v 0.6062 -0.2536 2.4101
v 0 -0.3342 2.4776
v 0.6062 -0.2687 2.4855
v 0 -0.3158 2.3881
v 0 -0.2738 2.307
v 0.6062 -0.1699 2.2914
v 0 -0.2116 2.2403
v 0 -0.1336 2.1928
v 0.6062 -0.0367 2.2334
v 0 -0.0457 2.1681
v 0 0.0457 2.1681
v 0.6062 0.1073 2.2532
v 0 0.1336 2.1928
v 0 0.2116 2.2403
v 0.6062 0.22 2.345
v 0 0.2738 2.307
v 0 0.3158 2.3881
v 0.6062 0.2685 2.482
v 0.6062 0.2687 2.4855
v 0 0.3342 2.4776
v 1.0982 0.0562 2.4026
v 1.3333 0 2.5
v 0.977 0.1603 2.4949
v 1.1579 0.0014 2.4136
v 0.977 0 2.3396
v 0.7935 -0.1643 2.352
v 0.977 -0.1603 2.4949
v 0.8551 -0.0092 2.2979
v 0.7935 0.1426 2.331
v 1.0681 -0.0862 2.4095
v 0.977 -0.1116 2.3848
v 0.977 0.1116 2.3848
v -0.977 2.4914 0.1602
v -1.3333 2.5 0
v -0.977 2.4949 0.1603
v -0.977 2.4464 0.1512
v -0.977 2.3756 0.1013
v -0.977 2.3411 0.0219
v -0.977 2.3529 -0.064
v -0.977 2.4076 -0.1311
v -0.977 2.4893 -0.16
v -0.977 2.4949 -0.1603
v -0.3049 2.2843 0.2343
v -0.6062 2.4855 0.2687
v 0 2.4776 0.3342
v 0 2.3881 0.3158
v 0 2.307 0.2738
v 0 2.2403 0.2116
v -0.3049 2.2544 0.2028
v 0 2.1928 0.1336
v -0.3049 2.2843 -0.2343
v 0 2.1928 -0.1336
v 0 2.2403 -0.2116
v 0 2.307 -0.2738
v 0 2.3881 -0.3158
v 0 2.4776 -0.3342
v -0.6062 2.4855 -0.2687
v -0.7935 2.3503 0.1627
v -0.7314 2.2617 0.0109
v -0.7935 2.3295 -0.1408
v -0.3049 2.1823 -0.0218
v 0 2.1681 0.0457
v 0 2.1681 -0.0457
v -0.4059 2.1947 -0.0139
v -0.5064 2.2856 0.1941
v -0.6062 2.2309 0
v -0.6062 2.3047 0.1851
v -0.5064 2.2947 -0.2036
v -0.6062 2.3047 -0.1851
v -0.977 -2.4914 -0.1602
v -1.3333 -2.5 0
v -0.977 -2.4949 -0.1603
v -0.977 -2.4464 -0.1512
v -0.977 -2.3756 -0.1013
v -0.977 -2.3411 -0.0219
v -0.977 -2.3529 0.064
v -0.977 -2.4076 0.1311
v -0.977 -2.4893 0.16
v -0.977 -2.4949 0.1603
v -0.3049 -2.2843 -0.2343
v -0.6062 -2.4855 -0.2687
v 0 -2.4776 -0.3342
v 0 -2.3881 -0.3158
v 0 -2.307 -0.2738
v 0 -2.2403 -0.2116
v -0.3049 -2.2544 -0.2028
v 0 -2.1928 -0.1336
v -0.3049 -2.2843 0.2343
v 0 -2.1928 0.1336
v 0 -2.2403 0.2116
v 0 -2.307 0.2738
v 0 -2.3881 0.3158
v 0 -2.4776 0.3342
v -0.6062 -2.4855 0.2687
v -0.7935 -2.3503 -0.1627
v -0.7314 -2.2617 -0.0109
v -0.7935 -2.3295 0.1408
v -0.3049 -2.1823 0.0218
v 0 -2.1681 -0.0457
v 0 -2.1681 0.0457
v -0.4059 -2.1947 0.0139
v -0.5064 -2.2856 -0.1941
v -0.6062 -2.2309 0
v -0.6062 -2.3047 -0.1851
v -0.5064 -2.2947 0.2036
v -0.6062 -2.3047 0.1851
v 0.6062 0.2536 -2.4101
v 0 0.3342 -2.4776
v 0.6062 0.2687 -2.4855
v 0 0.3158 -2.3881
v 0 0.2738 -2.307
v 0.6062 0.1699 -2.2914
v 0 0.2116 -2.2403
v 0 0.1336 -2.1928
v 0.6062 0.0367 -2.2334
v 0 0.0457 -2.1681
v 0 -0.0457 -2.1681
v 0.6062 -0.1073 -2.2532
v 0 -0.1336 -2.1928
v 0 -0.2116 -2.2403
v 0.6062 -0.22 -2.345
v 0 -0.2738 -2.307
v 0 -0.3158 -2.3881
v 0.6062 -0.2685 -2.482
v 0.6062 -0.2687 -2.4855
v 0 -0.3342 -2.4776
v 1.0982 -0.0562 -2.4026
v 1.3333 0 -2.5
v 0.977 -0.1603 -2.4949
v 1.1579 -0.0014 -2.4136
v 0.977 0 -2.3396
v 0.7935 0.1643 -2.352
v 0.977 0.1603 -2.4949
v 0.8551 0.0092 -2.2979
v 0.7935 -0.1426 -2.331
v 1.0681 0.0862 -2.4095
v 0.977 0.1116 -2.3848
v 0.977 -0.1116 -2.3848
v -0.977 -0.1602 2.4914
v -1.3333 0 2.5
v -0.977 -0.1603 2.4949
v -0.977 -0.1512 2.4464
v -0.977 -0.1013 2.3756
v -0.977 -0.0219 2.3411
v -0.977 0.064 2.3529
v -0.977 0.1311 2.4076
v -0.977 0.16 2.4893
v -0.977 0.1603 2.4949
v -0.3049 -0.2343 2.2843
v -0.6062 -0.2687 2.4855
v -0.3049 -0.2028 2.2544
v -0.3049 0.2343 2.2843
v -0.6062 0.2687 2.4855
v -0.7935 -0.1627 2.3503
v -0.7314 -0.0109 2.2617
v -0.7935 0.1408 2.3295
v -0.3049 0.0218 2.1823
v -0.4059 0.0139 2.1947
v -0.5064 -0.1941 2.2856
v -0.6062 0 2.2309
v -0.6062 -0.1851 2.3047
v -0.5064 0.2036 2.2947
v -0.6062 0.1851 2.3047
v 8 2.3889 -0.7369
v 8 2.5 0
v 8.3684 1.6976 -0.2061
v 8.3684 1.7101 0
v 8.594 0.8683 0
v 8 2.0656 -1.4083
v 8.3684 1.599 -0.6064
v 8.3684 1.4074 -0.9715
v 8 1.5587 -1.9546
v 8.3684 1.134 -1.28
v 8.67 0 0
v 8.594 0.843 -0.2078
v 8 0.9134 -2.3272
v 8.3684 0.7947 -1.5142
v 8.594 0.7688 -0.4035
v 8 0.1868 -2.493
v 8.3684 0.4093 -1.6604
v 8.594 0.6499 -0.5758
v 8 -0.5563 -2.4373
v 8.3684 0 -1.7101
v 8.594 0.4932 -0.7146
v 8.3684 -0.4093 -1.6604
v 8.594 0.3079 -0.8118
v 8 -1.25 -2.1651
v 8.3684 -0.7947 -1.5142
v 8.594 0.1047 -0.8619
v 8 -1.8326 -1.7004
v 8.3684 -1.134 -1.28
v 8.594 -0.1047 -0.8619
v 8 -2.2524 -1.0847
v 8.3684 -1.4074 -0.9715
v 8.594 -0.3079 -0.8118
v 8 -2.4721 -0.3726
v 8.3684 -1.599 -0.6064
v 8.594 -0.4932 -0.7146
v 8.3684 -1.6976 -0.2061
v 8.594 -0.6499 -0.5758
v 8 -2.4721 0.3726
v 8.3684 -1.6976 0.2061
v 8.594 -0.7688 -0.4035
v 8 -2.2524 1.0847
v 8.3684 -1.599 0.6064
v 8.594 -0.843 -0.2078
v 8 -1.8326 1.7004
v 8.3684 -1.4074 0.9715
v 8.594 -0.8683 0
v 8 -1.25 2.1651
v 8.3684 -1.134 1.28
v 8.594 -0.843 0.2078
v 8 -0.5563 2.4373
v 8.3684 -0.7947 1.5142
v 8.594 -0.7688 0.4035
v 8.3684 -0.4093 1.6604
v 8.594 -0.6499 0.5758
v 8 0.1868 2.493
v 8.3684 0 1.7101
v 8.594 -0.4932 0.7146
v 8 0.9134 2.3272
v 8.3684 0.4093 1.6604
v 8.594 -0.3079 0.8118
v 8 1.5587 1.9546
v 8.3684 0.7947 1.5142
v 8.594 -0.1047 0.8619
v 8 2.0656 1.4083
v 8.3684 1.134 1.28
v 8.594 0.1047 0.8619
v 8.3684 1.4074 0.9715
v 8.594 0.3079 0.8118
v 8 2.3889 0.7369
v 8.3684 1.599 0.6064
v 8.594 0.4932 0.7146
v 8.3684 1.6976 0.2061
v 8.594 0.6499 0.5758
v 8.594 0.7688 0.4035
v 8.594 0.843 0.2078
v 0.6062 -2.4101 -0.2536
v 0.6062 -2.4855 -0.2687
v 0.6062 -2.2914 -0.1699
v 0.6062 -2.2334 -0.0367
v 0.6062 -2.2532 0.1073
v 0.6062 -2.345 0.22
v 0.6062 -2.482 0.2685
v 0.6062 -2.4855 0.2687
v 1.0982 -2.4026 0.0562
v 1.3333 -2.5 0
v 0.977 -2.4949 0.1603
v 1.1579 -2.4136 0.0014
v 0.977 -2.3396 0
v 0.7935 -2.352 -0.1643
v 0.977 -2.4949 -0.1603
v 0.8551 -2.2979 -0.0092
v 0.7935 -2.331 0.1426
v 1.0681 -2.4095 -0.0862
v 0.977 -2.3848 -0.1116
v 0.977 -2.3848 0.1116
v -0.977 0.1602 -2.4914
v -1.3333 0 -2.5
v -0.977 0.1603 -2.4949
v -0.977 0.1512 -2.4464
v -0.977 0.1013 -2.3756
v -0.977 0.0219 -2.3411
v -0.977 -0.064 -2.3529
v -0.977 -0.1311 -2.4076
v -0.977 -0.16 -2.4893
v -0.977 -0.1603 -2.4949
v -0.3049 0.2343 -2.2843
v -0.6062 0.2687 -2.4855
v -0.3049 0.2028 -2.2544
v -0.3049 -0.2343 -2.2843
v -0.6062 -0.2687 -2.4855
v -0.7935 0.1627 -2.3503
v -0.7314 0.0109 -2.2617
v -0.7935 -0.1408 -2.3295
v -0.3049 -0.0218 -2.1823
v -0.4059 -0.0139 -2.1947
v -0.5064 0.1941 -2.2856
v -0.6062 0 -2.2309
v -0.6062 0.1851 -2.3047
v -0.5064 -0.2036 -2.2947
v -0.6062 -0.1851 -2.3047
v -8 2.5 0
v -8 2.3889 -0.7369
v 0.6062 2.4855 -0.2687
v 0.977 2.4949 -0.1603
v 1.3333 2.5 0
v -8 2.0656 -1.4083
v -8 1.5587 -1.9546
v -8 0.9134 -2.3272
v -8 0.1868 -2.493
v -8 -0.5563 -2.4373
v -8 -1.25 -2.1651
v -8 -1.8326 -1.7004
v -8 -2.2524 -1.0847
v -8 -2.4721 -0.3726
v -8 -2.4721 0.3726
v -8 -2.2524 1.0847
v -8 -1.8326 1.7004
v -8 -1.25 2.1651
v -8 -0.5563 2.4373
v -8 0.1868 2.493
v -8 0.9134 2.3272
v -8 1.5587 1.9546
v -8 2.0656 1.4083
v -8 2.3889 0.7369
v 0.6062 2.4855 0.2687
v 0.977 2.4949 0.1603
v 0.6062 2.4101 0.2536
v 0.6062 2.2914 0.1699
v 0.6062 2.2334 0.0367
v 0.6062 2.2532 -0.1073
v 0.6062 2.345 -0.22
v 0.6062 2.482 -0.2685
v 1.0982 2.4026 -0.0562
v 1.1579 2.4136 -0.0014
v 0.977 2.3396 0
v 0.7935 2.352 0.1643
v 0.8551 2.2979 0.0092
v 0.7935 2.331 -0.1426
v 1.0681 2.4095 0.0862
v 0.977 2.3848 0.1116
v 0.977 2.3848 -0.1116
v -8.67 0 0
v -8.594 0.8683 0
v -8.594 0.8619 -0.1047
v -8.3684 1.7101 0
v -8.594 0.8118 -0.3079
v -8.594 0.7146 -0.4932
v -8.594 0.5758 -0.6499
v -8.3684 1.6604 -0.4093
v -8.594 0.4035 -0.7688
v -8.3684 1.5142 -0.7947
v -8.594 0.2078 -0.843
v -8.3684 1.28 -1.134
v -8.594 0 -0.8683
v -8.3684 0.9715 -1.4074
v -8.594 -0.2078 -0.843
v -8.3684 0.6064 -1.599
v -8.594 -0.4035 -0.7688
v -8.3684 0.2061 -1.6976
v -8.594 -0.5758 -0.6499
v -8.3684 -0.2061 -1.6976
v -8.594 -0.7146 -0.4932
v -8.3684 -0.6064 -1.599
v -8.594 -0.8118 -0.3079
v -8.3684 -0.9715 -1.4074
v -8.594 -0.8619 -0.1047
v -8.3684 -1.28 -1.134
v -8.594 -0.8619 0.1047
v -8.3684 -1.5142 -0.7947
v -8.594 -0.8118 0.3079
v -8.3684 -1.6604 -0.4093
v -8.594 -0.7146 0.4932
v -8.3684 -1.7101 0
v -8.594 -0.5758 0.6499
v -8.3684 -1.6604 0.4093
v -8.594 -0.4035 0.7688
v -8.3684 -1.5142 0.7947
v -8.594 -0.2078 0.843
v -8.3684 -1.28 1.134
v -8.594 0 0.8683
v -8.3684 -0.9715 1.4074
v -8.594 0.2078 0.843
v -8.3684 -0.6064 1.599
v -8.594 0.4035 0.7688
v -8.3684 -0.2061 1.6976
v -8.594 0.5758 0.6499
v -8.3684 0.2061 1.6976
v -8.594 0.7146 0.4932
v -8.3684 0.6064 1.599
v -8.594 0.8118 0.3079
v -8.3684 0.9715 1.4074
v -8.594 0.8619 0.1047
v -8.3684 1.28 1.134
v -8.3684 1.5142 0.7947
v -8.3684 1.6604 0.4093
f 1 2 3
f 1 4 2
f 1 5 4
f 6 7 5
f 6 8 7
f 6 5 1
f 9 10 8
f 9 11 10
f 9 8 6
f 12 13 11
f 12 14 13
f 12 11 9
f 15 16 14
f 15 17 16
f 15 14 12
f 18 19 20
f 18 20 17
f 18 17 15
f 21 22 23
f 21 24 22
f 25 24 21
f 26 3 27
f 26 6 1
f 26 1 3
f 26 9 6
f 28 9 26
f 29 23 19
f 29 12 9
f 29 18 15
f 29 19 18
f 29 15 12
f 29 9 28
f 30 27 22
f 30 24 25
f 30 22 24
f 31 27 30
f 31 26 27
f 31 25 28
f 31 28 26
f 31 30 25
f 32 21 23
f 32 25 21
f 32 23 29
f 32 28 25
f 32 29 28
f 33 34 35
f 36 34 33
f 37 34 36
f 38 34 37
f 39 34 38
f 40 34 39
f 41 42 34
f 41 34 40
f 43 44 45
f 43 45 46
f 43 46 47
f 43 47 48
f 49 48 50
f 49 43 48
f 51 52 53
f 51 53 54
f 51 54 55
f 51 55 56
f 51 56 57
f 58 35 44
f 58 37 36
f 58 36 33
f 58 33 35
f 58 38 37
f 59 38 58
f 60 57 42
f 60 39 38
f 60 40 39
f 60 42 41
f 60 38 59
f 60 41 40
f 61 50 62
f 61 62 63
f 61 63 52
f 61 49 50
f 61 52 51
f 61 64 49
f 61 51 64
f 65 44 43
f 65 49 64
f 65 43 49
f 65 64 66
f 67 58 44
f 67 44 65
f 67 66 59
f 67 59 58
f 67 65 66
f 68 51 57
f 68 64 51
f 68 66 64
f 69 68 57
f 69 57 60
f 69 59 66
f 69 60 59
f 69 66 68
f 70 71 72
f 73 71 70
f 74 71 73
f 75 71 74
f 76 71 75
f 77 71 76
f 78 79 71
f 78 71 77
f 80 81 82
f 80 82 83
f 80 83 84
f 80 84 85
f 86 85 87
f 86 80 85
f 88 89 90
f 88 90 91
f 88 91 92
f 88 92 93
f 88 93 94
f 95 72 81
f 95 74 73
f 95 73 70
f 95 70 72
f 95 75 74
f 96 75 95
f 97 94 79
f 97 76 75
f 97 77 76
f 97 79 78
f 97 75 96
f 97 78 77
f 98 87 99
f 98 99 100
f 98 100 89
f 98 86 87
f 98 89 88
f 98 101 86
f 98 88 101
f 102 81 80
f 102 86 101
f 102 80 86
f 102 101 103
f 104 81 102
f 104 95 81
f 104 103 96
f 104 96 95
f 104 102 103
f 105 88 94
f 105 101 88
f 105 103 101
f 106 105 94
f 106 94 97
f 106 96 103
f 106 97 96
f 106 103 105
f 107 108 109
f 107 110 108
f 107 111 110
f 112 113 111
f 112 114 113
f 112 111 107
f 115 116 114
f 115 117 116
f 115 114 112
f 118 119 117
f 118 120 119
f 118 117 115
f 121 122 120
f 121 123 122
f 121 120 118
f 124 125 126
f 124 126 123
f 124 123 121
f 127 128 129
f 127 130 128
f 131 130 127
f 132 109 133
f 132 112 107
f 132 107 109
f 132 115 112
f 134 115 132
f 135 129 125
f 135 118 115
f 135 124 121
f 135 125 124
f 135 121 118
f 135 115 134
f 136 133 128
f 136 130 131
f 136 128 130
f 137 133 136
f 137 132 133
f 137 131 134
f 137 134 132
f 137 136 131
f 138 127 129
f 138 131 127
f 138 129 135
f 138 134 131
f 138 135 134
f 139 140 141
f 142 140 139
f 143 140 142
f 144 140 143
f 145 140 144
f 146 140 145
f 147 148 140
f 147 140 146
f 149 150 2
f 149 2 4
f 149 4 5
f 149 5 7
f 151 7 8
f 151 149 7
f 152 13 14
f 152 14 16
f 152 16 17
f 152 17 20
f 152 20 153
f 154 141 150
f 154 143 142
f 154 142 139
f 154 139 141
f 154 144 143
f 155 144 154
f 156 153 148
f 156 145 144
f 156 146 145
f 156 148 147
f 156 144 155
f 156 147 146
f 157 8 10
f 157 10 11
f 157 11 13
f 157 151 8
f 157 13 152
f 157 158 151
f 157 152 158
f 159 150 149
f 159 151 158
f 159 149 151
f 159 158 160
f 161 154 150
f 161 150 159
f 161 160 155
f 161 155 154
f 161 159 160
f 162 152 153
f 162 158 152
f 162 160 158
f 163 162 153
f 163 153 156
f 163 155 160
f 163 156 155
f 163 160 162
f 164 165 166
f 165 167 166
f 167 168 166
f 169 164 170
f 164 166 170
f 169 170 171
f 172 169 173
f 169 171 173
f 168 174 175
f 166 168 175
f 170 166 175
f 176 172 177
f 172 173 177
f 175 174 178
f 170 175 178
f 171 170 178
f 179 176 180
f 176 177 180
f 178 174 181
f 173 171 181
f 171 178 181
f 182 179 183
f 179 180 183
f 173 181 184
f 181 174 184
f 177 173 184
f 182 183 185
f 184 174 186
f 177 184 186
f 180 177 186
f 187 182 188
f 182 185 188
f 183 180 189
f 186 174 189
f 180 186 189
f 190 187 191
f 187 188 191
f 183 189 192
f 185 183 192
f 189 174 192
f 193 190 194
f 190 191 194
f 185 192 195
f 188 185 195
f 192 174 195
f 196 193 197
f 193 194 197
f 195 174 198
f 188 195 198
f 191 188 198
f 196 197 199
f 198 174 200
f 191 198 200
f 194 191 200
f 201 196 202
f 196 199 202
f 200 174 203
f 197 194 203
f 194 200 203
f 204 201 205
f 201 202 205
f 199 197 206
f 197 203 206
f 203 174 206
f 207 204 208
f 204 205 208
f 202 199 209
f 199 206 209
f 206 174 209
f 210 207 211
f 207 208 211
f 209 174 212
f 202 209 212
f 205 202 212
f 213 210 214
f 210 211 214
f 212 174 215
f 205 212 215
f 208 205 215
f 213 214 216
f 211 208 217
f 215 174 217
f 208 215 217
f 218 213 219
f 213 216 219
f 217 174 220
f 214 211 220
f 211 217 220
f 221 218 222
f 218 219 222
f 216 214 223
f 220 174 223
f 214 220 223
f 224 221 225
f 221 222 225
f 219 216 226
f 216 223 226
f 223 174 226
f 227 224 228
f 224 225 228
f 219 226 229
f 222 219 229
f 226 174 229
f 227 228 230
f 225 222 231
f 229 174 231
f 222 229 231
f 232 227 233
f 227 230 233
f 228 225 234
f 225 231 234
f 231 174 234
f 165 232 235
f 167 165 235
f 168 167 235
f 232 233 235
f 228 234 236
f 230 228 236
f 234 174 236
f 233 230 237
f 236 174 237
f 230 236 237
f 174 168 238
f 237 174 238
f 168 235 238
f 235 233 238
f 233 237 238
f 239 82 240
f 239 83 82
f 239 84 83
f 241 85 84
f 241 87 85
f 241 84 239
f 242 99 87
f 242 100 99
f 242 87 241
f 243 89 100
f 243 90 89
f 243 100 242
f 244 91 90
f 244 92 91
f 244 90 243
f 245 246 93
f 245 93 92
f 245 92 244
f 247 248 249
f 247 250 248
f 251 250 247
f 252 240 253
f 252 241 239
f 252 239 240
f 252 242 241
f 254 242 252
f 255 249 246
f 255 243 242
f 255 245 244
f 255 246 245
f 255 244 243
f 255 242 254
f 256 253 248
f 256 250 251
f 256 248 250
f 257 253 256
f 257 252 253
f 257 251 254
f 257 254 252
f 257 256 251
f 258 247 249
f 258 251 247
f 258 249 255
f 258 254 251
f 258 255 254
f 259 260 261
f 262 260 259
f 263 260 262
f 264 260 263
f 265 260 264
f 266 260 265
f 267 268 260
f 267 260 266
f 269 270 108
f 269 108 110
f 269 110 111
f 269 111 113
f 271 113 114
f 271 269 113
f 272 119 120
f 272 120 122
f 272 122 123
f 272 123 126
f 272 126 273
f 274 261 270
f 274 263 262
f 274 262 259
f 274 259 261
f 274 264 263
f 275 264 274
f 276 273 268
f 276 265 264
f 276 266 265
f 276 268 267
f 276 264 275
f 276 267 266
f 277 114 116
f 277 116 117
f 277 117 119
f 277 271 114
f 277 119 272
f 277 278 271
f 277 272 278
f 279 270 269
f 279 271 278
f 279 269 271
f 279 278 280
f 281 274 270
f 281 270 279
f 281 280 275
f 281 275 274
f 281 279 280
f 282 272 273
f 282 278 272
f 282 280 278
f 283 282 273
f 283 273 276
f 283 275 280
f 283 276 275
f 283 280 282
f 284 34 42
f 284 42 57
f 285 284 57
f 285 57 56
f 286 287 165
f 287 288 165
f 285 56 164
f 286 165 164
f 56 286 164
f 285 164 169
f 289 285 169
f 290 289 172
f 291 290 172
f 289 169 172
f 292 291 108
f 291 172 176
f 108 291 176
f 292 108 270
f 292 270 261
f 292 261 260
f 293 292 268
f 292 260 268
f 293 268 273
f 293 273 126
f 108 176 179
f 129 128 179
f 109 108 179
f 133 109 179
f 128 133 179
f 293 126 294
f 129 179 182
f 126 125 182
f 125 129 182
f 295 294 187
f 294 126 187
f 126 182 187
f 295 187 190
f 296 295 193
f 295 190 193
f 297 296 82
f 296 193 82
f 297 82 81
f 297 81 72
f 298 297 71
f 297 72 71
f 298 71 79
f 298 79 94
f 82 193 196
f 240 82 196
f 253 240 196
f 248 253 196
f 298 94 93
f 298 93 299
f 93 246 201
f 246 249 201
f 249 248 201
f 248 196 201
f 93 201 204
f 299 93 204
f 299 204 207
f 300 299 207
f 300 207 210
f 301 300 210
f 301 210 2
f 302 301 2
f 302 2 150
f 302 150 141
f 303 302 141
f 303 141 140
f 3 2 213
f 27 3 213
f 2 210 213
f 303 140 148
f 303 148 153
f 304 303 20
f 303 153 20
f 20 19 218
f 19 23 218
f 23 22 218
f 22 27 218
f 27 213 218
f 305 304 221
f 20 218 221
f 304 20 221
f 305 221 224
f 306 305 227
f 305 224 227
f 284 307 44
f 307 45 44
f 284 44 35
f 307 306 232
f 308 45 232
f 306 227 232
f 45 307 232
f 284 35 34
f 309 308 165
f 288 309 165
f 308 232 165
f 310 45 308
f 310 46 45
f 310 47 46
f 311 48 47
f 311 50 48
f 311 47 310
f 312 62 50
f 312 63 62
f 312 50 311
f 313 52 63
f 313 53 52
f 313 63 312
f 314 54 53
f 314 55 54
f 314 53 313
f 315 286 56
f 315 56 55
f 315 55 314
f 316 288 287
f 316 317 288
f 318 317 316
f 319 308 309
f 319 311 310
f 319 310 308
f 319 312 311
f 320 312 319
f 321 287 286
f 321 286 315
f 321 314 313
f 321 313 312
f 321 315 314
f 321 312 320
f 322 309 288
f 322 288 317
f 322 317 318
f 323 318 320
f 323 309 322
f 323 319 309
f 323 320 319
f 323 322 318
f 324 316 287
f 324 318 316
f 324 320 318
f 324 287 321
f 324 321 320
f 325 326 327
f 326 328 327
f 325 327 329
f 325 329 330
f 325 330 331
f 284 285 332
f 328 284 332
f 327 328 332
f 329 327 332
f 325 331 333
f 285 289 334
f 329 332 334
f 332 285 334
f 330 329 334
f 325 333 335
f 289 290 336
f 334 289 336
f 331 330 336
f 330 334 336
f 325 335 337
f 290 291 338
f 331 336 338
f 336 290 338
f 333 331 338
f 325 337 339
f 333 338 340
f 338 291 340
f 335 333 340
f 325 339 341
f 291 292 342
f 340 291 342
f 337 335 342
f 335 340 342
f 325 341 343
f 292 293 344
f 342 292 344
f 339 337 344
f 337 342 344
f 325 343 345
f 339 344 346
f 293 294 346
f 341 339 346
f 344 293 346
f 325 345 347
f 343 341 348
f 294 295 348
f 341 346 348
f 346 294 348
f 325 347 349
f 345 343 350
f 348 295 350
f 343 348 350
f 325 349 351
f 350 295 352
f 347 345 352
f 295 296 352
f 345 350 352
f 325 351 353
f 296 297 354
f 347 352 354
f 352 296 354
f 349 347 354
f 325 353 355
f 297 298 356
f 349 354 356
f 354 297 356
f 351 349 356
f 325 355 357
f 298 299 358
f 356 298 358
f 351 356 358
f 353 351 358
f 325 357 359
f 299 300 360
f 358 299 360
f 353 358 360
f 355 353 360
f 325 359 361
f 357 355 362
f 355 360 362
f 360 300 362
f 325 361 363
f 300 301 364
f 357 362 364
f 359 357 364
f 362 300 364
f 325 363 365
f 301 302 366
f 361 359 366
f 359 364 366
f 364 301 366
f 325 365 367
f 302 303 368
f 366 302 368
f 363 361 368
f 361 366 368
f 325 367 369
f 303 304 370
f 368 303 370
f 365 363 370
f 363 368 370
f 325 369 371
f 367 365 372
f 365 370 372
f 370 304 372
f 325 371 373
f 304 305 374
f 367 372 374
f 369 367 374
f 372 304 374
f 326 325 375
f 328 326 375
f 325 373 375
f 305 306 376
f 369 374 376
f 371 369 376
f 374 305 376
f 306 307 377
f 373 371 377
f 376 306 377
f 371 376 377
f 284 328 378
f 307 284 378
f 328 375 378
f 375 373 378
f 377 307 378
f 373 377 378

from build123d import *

# Parameters (mm, degrees)
R_P_TITION_CIRCULAIRE1_COUNT = 4


with BuildPart() as part:
    # Esquisse1 → Base-Révolution (revolve)
    with BuildSketch(Plane.XY):
        with BuildLine():
            Line((-8, 2.5), (8, 2.5))
            ThreePointArc((8, 2.5), (8.499595763, 1.294111664), (8.67, 0))
            Line((8.67, 0), (-8.67, 0))
            ThreePointArc((-8.67, 0), (-8.499595763, 1.294111664), (-8, 2.5))
        make_face()
    revolve(axis=Axis((0, 0, 0), (-1, 0, 0)))

    # Esquisse2 → Enlever de la matière-Révolution1 (revolve, cut)
    with BuildSketch(Plane(origin=(0, 2.5, 0), x_dir=(-1, 0, 0), z_dir=(0, 1, 0))):
        with BuildLine():
            Line((1.333333333, 0), (-1.333333333, 0))
            ThreePointArc((-1.333333333, 0), (-0.687386859, 0.249968429), (0, 0.335))
            ThreePointArc((0, 0.335), (0.687386859, 0.249968429), (1.333333333, 0))
        make_face()
    enlever_de_la_mati_re_r_volution1 = revolve(axis=Axis((0, 2.5, 0), (1, 0, 0)), mode=Mode.SUBTRACT)

    # Répétition circulaire1: Enlever de la matière-Révolution1 ×4 about axis
    r_p_tition_circulaire1_axis = Axis((50, 0, 0), (-1, 0, 0))
    for i in range(1, R_P_TITION_CIRCULAIRE1_COUNT):
        add(enlever_de_la_mati_re_r_volution1.rotate(r_p_tition_circulaire1_axis, i * 360 / R_P_TITION_CIRCULAIRE1_COUNT), mode=Mode.SUBTRACT)


solid = part.part
